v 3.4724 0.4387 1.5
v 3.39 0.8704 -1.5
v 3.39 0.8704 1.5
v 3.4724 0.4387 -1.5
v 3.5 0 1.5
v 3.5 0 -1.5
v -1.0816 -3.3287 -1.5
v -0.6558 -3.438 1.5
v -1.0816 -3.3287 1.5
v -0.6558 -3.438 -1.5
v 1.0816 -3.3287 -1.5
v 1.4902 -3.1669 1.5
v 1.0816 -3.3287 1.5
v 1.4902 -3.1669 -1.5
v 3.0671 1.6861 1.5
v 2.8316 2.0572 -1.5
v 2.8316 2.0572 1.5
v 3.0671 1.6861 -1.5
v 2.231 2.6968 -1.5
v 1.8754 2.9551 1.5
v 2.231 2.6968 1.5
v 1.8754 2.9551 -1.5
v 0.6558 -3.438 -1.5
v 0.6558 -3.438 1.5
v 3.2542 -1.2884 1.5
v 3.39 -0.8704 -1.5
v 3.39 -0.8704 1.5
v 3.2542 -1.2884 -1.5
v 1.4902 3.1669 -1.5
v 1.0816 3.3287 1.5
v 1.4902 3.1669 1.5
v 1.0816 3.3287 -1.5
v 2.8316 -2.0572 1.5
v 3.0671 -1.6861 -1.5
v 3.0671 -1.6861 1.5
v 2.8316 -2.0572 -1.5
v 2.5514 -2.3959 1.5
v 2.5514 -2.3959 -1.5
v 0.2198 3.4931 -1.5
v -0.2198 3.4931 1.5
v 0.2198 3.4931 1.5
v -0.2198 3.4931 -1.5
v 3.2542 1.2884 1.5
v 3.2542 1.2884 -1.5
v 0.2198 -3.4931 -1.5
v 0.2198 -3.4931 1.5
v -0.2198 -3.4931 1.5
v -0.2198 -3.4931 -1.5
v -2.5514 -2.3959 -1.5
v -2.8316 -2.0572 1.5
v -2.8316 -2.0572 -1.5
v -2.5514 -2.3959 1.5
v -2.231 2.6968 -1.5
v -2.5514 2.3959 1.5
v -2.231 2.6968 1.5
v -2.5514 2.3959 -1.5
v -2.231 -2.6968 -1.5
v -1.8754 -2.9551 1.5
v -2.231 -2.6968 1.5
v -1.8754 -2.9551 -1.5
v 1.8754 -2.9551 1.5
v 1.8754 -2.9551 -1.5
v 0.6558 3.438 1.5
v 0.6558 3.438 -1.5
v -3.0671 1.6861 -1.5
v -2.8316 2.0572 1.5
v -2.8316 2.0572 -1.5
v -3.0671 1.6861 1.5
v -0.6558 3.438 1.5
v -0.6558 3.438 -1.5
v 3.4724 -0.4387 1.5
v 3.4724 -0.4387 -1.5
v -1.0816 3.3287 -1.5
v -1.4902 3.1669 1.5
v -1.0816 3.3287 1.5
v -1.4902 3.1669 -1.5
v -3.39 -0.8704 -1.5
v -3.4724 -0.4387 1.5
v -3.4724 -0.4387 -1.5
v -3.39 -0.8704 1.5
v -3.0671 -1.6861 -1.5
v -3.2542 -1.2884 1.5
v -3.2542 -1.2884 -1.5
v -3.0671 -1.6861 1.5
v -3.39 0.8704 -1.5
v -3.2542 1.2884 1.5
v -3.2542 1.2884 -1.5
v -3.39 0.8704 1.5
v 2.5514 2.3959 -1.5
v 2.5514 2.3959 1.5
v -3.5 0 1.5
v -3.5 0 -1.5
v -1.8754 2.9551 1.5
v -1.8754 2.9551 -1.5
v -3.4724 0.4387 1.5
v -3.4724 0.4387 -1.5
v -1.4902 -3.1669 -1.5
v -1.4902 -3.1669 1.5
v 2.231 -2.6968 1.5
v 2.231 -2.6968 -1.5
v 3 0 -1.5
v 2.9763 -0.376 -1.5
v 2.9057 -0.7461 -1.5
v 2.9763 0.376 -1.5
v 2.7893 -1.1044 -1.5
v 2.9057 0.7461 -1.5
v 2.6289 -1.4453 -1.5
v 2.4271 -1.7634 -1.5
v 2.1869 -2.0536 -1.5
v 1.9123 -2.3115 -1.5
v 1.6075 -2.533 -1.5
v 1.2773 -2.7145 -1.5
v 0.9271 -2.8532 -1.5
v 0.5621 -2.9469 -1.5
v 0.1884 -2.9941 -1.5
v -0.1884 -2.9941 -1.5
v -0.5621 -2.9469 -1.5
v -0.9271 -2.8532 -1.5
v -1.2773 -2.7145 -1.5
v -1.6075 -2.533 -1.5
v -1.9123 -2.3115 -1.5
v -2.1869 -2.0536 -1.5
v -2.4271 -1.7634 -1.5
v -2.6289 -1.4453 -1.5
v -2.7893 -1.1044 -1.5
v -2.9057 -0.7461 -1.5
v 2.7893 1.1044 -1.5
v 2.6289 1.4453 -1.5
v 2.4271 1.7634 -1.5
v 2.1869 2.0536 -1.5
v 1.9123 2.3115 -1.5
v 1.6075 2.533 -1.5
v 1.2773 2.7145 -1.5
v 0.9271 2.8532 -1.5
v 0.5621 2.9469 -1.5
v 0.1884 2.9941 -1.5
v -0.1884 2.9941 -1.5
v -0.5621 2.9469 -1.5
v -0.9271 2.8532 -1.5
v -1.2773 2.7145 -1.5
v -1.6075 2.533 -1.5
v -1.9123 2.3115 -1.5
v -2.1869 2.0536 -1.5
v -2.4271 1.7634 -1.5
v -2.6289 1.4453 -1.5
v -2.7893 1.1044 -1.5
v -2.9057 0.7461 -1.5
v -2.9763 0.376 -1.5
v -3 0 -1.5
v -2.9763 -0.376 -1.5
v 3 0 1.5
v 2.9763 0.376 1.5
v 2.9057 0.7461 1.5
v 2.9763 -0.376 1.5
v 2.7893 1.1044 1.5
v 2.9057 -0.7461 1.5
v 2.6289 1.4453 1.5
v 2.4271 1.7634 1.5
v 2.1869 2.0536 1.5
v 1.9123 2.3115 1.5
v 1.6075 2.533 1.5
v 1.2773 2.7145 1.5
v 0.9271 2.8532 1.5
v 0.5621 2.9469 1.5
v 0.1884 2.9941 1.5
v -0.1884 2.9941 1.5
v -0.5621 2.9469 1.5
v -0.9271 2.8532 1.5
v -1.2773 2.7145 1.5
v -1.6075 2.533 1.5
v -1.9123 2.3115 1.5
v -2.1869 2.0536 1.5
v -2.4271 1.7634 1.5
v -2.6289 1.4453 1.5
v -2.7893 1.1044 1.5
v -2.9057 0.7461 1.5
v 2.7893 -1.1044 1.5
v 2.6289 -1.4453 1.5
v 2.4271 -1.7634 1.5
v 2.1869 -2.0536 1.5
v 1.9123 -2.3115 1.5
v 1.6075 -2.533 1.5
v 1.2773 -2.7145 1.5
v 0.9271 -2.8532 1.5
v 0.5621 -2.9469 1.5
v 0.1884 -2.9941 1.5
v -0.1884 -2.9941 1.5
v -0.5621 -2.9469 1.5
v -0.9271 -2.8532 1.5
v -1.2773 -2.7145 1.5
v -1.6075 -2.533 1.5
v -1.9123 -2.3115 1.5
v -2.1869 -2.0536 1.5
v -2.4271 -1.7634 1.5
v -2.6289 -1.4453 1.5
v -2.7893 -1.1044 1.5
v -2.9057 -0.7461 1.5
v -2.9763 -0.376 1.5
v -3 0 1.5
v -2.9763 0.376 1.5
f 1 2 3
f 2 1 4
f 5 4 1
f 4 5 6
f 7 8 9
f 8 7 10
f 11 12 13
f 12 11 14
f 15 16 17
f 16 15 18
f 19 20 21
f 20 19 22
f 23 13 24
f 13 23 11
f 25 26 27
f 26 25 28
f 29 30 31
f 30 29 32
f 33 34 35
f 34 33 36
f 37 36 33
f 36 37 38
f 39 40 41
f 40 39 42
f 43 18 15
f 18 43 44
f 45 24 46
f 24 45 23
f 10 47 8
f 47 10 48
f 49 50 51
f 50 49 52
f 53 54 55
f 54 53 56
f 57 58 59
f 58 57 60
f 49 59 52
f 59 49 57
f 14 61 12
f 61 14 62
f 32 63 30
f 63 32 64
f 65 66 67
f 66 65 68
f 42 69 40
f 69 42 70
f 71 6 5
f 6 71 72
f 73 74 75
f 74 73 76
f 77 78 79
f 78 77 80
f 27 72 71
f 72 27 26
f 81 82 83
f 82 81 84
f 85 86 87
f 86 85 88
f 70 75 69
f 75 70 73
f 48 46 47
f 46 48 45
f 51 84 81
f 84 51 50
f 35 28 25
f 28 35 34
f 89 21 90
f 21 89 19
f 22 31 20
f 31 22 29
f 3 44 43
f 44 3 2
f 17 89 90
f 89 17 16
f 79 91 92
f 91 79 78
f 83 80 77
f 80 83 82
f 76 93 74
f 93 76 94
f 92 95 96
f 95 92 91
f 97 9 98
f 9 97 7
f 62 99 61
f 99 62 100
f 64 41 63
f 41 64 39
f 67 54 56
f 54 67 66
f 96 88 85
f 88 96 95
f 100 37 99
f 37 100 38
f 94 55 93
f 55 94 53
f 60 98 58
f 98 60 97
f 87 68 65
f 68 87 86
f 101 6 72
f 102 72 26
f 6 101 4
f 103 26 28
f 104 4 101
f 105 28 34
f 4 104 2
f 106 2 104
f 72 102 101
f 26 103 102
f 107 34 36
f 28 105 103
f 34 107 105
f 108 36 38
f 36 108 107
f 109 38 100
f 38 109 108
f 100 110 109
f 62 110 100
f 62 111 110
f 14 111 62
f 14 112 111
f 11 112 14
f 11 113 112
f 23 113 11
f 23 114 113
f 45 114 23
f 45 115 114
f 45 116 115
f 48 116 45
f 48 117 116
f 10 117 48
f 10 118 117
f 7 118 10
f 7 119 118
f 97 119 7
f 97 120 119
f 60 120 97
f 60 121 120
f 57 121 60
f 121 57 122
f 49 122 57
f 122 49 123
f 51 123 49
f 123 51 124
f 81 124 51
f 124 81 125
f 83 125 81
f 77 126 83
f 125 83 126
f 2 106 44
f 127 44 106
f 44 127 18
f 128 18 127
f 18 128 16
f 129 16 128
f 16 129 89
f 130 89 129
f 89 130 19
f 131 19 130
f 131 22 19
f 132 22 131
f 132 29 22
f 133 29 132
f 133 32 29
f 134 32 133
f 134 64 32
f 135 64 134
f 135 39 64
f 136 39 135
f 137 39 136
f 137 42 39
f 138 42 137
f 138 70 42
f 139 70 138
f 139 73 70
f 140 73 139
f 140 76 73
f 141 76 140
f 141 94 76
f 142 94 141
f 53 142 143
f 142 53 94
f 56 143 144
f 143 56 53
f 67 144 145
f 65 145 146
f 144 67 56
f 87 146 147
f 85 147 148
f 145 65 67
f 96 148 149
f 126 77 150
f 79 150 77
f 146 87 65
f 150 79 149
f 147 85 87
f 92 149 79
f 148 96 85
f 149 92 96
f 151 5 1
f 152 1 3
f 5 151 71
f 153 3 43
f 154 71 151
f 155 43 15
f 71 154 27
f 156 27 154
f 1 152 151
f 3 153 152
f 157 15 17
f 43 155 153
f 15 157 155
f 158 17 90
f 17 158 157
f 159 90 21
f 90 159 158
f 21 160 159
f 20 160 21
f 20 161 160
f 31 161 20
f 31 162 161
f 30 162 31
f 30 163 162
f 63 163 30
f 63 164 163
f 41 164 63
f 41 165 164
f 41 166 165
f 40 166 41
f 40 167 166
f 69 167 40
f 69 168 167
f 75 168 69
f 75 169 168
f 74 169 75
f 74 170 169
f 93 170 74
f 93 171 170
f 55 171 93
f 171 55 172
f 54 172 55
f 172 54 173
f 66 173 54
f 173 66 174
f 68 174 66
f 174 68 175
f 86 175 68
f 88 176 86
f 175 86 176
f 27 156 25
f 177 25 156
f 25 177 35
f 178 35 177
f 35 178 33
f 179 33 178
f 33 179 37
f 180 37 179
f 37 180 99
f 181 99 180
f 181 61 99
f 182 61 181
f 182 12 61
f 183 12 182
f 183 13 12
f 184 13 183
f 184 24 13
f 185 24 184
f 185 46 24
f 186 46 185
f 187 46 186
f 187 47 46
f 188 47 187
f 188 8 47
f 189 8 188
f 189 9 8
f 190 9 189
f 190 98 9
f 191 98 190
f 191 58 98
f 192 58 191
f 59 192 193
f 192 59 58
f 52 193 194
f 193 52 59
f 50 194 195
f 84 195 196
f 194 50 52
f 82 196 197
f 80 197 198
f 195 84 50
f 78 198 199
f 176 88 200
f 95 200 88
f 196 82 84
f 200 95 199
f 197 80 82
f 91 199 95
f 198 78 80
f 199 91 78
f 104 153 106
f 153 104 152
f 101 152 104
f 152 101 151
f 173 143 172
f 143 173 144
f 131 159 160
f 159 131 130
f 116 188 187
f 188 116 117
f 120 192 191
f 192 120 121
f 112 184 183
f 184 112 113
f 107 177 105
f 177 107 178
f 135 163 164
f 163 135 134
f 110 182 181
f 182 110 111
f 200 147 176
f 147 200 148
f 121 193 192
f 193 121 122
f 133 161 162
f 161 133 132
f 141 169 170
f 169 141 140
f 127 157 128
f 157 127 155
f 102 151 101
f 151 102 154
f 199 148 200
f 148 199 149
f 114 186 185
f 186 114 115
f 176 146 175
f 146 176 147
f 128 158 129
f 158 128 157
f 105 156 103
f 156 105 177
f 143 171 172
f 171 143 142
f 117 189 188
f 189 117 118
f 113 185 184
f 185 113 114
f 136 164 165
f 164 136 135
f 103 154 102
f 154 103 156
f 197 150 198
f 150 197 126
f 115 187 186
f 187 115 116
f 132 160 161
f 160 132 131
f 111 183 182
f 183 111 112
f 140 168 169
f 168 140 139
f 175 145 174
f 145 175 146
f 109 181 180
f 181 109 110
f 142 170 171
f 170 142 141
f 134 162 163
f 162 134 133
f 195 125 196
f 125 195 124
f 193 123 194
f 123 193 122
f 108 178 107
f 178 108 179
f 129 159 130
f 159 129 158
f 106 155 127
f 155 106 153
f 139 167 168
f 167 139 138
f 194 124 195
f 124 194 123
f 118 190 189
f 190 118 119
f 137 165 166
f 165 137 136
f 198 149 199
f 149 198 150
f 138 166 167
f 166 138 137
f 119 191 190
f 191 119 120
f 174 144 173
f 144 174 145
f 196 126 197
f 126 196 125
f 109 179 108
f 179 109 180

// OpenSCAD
$fn = 50;


difference() {
	union() {
		translate(v = [0, 0, -1.5000000000]) {
			cylinder(h = 3, r = 3.5000000000);
		}
	}
	union() {
		translate(v = [0, 0, -100.0000000000]) {
			cylinder(h = 200, r = 3.0000000000);
		}
	}
}
